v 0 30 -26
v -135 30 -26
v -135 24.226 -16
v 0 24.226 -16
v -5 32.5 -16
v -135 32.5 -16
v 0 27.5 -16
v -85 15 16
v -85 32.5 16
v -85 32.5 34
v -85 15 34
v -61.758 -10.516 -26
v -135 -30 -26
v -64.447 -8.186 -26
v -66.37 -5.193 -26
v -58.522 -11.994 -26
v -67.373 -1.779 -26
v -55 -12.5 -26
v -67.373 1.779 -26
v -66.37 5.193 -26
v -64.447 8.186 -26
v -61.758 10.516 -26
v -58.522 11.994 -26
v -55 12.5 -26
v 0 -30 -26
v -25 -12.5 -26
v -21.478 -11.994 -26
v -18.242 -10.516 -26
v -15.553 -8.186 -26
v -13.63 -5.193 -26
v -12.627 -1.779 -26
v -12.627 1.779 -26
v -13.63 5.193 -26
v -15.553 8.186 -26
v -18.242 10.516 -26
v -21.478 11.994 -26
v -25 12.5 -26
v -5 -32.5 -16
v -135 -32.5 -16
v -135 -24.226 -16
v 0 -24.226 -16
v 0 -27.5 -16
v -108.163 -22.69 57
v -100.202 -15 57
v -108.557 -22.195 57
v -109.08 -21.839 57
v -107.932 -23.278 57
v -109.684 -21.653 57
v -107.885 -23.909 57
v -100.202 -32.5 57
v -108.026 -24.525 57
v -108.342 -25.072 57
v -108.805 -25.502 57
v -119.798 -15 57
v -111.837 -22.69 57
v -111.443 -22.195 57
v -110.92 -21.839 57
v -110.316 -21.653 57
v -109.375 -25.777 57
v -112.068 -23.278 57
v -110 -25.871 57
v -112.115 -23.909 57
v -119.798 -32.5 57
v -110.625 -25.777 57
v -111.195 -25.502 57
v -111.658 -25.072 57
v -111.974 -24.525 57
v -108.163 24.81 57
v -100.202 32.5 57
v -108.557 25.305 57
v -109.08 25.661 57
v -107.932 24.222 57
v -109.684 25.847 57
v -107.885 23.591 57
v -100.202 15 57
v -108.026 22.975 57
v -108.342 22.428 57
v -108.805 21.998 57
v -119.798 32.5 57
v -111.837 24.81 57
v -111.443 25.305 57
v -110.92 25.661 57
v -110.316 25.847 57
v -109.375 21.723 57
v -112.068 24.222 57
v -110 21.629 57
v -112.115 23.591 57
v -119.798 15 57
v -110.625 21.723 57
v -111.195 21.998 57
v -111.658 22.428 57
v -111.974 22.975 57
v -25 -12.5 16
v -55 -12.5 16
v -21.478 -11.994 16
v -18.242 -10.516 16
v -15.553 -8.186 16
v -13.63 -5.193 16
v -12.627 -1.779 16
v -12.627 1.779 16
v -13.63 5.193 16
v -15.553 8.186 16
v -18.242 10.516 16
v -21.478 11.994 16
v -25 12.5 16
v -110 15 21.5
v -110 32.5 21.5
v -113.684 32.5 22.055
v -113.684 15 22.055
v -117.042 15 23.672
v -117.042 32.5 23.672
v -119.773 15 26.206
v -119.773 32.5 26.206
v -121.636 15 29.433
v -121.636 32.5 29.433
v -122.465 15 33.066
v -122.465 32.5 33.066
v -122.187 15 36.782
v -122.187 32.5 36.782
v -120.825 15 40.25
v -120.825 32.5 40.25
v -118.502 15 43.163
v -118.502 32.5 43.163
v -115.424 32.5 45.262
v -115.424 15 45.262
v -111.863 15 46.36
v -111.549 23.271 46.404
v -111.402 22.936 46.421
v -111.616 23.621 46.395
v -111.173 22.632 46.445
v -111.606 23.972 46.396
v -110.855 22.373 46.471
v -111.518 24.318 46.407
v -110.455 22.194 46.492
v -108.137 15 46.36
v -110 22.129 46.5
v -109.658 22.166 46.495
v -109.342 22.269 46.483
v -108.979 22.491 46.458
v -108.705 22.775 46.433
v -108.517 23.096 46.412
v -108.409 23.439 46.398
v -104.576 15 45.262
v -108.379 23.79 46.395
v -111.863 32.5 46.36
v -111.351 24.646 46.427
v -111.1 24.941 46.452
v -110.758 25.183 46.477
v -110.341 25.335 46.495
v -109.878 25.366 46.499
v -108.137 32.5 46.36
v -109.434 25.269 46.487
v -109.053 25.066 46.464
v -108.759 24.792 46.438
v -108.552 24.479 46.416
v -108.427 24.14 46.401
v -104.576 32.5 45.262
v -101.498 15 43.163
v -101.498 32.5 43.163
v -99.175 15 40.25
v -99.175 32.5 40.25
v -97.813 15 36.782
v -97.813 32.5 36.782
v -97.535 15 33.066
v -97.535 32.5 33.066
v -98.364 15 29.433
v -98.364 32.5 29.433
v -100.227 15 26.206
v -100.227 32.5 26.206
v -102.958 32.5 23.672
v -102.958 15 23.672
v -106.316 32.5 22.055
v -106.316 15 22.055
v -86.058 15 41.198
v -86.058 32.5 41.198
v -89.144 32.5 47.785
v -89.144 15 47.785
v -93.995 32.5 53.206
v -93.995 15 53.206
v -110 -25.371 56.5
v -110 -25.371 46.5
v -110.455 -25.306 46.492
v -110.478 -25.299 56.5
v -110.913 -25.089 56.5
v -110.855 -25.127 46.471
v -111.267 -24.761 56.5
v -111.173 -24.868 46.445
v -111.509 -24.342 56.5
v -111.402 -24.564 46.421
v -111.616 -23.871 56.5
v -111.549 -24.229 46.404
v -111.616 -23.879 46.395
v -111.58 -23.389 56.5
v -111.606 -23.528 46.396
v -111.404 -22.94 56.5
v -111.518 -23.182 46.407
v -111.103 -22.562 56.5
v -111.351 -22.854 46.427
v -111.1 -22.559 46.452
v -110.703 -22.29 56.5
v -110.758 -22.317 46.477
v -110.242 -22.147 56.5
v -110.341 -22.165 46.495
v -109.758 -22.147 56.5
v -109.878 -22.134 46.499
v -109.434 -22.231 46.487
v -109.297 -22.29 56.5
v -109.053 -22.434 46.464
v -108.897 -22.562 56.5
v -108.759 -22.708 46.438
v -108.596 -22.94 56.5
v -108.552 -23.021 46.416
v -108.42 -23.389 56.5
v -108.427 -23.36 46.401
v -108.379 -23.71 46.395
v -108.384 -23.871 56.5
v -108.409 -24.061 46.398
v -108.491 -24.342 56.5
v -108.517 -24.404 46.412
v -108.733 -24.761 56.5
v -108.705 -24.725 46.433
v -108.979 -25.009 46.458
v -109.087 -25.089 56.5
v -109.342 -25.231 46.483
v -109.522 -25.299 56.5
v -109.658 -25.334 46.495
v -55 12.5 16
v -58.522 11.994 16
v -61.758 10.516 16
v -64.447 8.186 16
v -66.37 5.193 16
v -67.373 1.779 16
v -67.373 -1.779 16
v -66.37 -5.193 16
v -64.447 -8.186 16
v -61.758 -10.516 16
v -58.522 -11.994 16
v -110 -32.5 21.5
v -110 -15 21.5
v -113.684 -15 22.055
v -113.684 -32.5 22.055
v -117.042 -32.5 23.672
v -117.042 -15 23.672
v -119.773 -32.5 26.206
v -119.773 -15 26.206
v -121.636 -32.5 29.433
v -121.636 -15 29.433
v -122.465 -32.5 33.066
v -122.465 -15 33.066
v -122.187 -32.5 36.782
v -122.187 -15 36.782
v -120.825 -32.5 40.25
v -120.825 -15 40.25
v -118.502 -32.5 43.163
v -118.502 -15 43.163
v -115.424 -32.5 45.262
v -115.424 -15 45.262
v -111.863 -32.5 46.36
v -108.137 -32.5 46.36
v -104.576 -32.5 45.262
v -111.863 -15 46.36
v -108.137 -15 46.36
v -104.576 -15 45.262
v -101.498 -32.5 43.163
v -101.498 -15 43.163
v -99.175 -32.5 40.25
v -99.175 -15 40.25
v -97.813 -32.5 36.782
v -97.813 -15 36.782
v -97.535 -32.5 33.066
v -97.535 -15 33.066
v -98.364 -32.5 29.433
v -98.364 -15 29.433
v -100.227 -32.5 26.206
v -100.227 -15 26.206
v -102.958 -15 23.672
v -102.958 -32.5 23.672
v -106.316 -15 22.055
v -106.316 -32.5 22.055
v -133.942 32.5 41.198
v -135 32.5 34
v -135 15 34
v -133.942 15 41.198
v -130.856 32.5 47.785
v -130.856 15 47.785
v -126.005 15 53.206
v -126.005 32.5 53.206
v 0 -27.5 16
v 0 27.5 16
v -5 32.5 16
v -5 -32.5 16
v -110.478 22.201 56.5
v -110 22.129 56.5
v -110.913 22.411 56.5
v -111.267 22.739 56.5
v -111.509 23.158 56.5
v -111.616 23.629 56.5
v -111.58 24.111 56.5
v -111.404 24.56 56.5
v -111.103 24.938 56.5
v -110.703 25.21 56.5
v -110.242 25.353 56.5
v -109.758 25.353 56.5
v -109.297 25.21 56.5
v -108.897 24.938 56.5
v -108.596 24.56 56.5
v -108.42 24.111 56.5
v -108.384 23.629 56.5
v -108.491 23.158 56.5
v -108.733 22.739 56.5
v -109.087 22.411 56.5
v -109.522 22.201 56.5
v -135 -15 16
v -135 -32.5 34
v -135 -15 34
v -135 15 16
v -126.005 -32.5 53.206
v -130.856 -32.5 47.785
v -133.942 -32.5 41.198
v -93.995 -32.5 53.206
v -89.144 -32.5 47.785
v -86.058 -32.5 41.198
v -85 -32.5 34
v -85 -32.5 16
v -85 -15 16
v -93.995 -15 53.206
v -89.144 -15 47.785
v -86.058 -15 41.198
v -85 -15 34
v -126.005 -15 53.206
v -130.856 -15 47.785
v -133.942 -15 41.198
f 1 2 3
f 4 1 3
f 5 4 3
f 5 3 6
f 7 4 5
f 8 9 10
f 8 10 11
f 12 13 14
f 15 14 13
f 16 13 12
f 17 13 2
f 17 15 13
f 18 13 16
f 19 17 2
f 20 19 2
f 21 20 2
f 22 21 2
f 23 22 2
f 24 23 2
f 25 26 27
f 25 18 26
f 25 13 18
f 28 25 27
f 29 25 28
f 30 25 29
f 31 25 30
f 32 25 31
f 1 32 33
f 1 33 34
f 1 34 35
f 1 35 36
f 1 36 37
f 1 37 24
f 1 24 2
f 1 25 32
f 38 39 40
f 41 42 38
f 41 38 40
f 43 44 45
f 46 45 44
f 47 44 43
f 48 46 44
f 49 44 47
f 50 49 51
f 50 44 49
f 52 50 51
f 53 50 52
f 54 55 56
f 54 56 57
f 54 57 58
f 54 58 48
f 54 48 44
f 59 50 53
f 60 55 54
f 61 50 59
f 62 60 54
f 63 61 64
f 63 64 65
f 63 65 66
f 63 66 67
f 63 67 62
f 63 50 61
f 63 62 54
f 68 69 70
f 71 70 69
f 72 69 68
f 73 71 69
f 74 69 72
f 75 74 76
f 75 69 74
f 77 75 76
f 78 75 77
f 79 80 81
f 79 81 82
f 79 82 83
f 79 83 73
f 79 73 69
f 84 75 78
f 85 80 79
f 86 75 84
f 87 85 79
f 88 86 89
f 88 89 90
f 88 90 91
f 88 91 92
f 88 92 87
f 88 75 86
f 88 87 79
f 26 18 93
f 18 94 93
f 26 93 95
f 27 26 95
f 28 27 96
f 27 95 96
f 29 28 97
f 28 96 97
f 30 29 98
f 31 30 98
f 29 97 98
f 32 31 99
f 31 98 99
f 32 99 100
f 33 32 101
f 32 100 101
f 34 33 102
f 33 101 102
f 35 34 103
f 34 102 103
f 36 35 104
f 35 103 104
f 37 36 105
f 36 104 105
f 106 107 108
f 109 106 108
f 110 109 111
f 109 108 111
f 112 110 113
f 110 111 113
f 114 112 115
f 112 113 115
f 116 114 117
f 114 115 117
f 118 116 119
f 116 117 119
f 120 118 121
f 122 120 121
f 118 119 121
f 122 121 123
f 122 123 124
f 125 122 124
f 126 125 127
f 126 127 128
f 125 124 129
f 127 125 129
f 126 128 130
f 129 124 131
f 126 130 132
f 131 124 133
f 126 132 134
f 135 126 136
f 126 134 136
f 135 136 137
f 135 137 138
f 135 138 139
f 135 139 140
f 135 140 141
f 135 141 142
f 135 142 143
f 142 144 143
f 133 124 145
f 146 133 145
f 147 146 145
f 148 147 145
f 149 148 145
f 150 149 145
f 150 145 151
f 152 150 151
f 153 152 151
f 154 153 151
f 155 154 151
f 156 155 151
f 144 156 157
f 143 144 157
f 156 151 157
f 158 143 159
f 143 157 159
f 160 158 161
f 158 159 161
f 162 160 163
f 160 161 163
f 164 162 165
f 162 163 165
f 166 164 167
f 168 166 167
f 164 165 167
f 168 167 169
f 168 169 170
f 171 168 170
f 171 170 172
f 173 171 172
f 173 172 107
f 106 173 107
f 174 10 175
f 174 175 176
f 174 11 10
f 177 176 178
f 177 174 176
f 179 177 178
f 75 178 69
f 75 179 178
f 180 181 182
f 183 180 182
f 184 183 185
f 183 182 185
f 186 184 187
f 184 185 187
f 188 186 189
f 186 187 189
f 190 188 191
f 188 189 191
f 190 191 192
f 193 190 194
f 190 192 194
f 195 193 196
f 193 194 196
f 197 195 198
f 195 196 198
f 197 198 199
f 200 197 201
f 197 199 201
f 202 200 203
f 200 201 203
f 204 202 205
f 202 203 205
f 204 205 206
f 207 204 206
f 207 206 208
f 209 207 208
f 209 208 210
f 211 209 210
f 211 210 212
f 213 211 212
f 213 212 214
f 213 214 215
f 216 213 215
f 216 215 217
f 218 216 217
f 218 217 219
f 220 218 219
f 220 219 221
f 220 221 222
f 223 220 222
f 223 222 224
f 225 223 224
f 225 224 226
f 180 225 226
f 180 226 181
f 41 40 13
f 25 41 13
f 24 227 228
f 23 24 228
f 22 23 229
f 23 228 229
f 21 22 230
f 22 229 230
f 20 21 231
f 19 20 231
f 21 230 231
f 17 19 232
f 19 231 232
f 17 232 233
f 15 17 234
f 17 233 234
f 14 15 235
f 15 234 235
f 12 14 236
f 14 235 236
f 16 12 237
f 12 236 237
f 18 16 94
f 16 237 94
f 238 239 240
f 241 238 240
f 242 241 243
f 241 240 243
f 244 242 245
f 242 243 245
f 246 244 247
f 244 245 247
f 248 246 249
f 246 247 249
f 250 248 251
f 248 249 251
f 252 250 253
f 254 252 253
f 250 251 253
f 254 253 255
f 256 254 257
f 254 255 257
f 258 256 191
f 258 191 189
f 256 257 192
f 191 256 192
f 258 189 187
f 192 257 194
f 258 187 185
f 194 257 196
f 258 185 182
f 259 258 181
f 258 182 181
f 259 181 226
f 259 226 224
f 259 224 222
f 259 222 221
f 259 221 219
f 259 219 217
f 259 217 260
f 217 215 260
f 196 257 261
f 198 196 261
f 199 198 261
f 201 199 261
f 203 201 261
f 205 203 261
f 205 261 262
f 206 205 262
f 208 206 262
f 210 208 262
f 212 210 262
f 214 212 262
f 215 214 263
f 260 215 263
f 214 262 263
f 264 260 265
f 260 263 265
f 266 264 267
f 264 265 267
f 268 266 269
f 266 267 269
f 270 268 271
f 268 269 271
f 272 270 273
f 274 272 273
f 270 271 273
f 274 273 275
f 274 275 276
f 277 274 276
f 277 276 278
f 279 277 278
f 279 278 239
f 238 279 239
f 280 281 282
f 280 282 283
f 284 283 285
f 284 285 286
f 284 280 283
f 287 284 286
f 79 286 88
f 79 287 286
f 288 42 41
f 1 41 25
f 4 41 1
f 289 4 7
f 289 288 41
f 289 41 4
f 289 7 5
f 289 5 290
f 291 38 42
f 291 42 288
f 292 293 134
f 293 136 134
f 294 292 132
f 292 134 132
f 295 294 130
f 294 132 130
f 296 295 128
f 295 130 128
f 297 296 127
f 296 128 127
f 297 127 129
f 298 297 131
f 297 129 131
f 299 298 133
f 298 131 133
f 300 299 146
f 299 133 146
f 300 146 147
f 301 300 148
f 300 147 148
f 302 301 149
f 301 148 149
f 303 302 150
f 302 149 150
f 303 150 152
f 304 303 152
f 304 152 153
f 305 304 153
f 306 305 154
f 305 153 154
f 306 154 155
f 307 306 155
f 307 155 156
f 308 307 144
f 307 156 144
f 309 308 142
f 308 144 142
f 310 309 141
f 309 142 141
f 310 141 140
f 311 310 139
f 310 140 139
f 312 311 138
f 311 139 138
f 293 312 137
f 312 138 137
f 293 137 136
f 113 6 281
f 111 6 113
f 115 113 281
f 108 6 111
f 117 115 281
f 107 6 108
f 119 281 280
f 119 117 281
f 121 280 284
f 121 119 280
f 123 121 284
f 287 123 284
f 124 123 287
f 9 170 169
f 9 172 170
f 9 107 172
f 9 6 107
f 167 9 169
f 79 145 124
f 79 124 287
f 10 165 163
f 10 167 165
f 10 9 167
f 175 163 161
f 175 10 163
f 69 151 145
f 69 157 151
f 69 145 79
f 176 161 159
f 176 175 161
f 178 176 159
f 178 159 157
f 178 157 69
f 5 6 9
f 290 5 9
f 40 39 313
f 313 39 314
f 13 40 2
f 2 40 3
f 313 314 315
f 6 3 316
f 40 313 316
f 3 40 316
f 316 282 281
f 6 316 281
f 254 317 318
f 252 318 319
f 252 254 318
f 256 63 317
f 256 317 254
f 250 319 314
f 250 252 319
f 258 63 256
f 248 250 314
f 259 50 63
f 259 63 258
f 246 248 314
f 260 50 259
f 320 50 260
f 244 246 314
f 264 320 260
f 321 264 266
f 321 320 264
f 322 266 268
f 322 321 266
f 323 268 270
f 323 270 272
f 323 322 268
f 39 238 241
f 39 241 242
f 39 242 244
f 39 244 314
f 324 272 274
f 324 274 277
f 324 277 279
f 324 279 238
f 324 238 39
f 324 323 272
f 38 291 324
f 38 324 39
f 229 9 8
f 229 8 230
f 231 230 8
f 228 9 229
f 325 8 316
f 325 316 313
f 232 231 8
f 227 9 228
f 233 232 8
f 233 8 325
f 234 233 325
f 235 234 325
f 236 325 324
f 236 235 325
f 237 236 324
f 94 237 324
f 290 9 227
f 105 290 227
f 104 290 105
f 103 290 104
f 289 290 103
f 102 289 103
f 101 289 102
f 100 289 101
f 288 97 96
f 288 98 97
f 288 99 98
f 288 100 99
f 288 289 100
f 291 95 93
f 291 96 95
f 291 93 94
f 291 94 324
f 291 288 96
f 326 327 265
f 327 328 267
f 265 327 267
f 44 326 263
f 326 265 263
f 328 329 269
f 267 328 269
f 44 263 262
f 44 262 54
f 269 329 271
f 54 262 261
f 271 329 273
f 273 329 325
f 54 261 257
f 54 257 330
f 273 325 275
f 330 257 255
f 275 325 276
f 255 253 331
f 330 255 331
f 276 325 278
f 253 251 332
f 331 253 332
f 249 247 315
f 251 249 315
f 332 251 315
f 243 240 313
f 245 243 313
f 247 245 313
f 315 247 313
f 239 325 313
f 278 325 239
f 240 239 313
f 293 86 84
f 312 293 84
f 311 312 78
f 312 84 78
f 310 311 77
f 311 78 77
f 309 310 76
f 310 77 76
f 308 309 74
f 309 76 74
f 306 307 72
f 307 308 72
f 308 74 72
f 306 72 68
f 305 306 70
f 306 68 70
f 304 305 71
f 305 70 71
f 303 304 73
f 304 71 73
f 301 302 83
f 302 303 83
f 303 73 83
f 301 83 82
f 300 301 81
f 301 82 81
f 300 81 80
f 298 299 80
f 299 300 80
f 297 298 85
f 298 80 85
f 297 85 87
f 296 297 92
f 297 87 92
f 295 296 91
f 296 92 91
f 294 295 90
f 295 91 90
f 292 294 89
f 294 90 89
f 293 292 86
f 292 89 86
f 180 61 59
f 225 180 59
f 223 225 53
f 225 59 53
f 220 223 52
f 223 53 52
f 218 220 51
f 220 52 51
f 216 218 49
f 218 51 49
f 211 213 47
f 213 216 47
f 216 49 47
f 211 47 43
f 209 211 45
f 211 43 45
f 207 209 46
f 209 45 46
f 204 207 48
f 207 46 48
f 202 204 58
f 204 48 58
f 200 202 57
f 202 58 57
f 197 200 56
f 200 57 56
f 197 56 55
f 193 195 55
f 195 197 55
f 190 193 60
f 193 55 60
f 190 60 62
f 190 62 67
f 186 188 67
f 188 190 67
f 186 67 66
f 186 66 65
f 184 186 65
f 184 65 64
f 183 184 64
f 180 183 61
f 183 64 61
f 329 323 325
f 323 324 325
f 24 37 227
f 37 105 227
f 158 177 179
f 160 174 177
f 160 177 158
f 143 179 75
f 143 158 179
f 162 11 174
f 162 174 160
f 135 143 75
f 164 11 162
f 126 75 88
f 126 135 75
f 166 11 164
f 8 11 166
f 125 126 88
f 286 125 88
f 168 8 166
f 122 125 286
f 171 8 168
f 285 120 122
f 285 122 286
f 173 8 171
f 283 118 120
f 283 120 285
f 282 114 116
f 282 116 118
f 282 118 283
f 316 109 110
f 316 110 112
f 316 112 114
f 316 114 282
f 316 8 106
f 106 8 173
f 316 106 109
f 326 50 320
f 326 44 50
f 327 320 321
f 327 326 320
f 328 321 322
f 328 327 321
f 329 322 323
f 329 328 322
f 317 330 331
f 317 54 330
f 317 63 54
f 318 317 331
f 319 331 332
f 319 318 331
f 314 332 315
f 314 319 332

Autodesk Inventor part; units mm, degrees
ref_plane "YZ Plane" through (0, 0, 0) normal (1, 0, 0) x (0, 1, 0)
ref_plane "XZ Plane" through (0, 0, 0) normal (0, 1, 0) x (-1, 0, 0)
ref_plane "XY Plane" through (0, 0, 0) normal (0, 0, 1) x (1, 0, 0)
sketch "Skizze1" plane through (0, 0, 0) normal (1, 0, 0) x (0, 1, 0)
  line L0 (-30, -26) -> (30, -26)
  line L1 (30, -26) -> (24.2265, -16)
  line L2 (24.2265, -16) -> (32.5, -16)
  line L3 (32.5, -16) -> (32.5, 16)
  line L4 (32.5, 16) -> (-32.5, 16)
  line L5 (-32.5, 16) -> (-32.5, -16)
  line L6 (-32.5, -16) -> (-24.2265, -16)
  line L7 (-24.2265, -16) -> (-30, -26)
  point P0 (0, 0)
  dimension "d0" = 60
  dimension "d1" = 65
  dimension "d2" = 2.5
  dimension "d3" = 10
  dimension "d4" = 42
  dimension "d5" = 60
  dimension "d6" = 60
  dimension "d7" = 16
  dimension "d8" = 32.5
extrude "Extrusion1" add sketch "Skizze1" against normal blind 135
sketch "Skizze2" plane through (0, -32.5, 16) normal (0, 0, 1) x (1, 0, 0)
  line L0 (0, 0) -> (-135, 0) projected
  line L1 (-135, 0) -> (-85, 0)
  line L2 (-85, 0) -> (-85, 17.5)
  line L3 (-85, 17.5) -> (-135, 17.5)
  line L4 (-135, 17.5) -> (-135, 0)
  line L5 (-135, 65) -> (-135, 56.7265) projected
  line L6 (-135, 65) -> (-85, 65)
  line L7 (-85, 65) -> (-85, 47.5)
  line L8 (-85, 47.5) -> (-135, 47.5)
  line L9 (-135, 47.5) -> (-135, 65)
  point P0 (0, 32.5)
  point P1 (-85, 0)
  dimension "d11" = 50
  dimension "d12" = 17.5
  dimension "d13" = 50
  dimension "d14" = 17.5
extrude "Extrusion2" add sketch "Skizze2" along normal blind 43
fillet "Rundung1" radius 25 4 edges at (-85, -23.75, 59) (-135, -23.75, 59) (-85, 23.75, 59) (-135, 23.75, 59)
sketch "Skizze3" plane through (0, -32.5, -16) normal (0, -1, 0) x (1, 0, 0)
  line L0 (-85, 32) -> (-85, 50) projected
  line L1 (0, -10) -> (-135, -10) projected
  point P0 (0, 16)
  point P1 (-110, 50)
  dimension "d25" = 25
  dimension "d26" = 60
hole "Bohrung1" at (-110, -32.5, 34) direction (0, 1, 0) diameter 25 end through all
sketch "Skizze4" plane through (0, -32.5, 16) normal (0, 0, 1) x (1, 0, 0)
  line L0 (-55, 32.5) -> (-25, 32.5) construction
  line L1 (-55, 20) -> (-25, 20)
  line L2 (-25, 45) -> (-55, 45)
  arc A0 (-55, 45) -> (-55, 20) centre (-55, 32.5) ccw
  arc A1 (-25, 20) -> (-25, 45) centre (-25, 32.5) ccw
  line L3 (0, 65) -> (0, 0) projected
  line L4 (0, 0) -> (-85, 0) projected
  point P0 (0, 32.5)
  point P1 (-40, 32.5)
  dimension "d27" = 30
  dimension "d28" = 25
  dimension "d29" = 32.5
  dimension "d30" = 25
extrude "Extrusion3" cut sketch "Skizze4" against normal through all
sketch "Skizze5" plane through (0, -32.5, -16) normal (0, -1, 0) x (1, 0, 0)
  line L0 (-135, 77) -> (-85, 77)
  line L1 (-85, 77) -> (-85, 73)
  line L2 (-85, 73) -> (-135, 73)
  line L3 (-135, 73) -> (-135, 77)
  line L4 (-85, 32) -> (-85, 50) projected
  line L5 (-135, 0) -> (-135, 50) projected
  arc A0 (-85, 50) -> (-135, 50) centre (-110, 50) ccw projected
  point P0 (0, 16)
  point P1 (-110, 73)
  point P2 (-110, 75)
  dimension "d33" = 2
  dimension "d34" = 4
extrude "Extrusion4" cut sketch "Skizze5" against normal through all
sketch "Skizze6" plane through (-119.798, -32.5, 57) normal (0, 0, 1) x (1, 0, 0)
  line L0 (119.798, 65) -> (119.798, 0) projected
  line L1 (0, 65) -> (19.5959, 65) projected
  point P0 (119.798, 32.5)
  point P1 (9.798, 8.75)
  point P2 (9.798, 56.25)
  dimension "d44" = 110
  dimension "d45" = 110
  dimension "d46" = 47.5
  dimension "d47" = 8.75
hole "Bohrung2" at (-110, -23.75, 57) at (-110, 23.75, 57) direction (0, 0, -1) diameter 3.242 depth 14 thread size "M4x0.7" class "6H" standard "ISO Metric profile"
chamfer "Fasen1" distance 0.5 angle 45 2 edges at (-110, 25.371, 57) (-110, -22.129, 57)
chamfer "Fasen2" distance 5 angle 45 2 edges at (0, -32.5, 0) (0, 32.5, 0)
properties part number "Schwalbenschwanzhalterung"
